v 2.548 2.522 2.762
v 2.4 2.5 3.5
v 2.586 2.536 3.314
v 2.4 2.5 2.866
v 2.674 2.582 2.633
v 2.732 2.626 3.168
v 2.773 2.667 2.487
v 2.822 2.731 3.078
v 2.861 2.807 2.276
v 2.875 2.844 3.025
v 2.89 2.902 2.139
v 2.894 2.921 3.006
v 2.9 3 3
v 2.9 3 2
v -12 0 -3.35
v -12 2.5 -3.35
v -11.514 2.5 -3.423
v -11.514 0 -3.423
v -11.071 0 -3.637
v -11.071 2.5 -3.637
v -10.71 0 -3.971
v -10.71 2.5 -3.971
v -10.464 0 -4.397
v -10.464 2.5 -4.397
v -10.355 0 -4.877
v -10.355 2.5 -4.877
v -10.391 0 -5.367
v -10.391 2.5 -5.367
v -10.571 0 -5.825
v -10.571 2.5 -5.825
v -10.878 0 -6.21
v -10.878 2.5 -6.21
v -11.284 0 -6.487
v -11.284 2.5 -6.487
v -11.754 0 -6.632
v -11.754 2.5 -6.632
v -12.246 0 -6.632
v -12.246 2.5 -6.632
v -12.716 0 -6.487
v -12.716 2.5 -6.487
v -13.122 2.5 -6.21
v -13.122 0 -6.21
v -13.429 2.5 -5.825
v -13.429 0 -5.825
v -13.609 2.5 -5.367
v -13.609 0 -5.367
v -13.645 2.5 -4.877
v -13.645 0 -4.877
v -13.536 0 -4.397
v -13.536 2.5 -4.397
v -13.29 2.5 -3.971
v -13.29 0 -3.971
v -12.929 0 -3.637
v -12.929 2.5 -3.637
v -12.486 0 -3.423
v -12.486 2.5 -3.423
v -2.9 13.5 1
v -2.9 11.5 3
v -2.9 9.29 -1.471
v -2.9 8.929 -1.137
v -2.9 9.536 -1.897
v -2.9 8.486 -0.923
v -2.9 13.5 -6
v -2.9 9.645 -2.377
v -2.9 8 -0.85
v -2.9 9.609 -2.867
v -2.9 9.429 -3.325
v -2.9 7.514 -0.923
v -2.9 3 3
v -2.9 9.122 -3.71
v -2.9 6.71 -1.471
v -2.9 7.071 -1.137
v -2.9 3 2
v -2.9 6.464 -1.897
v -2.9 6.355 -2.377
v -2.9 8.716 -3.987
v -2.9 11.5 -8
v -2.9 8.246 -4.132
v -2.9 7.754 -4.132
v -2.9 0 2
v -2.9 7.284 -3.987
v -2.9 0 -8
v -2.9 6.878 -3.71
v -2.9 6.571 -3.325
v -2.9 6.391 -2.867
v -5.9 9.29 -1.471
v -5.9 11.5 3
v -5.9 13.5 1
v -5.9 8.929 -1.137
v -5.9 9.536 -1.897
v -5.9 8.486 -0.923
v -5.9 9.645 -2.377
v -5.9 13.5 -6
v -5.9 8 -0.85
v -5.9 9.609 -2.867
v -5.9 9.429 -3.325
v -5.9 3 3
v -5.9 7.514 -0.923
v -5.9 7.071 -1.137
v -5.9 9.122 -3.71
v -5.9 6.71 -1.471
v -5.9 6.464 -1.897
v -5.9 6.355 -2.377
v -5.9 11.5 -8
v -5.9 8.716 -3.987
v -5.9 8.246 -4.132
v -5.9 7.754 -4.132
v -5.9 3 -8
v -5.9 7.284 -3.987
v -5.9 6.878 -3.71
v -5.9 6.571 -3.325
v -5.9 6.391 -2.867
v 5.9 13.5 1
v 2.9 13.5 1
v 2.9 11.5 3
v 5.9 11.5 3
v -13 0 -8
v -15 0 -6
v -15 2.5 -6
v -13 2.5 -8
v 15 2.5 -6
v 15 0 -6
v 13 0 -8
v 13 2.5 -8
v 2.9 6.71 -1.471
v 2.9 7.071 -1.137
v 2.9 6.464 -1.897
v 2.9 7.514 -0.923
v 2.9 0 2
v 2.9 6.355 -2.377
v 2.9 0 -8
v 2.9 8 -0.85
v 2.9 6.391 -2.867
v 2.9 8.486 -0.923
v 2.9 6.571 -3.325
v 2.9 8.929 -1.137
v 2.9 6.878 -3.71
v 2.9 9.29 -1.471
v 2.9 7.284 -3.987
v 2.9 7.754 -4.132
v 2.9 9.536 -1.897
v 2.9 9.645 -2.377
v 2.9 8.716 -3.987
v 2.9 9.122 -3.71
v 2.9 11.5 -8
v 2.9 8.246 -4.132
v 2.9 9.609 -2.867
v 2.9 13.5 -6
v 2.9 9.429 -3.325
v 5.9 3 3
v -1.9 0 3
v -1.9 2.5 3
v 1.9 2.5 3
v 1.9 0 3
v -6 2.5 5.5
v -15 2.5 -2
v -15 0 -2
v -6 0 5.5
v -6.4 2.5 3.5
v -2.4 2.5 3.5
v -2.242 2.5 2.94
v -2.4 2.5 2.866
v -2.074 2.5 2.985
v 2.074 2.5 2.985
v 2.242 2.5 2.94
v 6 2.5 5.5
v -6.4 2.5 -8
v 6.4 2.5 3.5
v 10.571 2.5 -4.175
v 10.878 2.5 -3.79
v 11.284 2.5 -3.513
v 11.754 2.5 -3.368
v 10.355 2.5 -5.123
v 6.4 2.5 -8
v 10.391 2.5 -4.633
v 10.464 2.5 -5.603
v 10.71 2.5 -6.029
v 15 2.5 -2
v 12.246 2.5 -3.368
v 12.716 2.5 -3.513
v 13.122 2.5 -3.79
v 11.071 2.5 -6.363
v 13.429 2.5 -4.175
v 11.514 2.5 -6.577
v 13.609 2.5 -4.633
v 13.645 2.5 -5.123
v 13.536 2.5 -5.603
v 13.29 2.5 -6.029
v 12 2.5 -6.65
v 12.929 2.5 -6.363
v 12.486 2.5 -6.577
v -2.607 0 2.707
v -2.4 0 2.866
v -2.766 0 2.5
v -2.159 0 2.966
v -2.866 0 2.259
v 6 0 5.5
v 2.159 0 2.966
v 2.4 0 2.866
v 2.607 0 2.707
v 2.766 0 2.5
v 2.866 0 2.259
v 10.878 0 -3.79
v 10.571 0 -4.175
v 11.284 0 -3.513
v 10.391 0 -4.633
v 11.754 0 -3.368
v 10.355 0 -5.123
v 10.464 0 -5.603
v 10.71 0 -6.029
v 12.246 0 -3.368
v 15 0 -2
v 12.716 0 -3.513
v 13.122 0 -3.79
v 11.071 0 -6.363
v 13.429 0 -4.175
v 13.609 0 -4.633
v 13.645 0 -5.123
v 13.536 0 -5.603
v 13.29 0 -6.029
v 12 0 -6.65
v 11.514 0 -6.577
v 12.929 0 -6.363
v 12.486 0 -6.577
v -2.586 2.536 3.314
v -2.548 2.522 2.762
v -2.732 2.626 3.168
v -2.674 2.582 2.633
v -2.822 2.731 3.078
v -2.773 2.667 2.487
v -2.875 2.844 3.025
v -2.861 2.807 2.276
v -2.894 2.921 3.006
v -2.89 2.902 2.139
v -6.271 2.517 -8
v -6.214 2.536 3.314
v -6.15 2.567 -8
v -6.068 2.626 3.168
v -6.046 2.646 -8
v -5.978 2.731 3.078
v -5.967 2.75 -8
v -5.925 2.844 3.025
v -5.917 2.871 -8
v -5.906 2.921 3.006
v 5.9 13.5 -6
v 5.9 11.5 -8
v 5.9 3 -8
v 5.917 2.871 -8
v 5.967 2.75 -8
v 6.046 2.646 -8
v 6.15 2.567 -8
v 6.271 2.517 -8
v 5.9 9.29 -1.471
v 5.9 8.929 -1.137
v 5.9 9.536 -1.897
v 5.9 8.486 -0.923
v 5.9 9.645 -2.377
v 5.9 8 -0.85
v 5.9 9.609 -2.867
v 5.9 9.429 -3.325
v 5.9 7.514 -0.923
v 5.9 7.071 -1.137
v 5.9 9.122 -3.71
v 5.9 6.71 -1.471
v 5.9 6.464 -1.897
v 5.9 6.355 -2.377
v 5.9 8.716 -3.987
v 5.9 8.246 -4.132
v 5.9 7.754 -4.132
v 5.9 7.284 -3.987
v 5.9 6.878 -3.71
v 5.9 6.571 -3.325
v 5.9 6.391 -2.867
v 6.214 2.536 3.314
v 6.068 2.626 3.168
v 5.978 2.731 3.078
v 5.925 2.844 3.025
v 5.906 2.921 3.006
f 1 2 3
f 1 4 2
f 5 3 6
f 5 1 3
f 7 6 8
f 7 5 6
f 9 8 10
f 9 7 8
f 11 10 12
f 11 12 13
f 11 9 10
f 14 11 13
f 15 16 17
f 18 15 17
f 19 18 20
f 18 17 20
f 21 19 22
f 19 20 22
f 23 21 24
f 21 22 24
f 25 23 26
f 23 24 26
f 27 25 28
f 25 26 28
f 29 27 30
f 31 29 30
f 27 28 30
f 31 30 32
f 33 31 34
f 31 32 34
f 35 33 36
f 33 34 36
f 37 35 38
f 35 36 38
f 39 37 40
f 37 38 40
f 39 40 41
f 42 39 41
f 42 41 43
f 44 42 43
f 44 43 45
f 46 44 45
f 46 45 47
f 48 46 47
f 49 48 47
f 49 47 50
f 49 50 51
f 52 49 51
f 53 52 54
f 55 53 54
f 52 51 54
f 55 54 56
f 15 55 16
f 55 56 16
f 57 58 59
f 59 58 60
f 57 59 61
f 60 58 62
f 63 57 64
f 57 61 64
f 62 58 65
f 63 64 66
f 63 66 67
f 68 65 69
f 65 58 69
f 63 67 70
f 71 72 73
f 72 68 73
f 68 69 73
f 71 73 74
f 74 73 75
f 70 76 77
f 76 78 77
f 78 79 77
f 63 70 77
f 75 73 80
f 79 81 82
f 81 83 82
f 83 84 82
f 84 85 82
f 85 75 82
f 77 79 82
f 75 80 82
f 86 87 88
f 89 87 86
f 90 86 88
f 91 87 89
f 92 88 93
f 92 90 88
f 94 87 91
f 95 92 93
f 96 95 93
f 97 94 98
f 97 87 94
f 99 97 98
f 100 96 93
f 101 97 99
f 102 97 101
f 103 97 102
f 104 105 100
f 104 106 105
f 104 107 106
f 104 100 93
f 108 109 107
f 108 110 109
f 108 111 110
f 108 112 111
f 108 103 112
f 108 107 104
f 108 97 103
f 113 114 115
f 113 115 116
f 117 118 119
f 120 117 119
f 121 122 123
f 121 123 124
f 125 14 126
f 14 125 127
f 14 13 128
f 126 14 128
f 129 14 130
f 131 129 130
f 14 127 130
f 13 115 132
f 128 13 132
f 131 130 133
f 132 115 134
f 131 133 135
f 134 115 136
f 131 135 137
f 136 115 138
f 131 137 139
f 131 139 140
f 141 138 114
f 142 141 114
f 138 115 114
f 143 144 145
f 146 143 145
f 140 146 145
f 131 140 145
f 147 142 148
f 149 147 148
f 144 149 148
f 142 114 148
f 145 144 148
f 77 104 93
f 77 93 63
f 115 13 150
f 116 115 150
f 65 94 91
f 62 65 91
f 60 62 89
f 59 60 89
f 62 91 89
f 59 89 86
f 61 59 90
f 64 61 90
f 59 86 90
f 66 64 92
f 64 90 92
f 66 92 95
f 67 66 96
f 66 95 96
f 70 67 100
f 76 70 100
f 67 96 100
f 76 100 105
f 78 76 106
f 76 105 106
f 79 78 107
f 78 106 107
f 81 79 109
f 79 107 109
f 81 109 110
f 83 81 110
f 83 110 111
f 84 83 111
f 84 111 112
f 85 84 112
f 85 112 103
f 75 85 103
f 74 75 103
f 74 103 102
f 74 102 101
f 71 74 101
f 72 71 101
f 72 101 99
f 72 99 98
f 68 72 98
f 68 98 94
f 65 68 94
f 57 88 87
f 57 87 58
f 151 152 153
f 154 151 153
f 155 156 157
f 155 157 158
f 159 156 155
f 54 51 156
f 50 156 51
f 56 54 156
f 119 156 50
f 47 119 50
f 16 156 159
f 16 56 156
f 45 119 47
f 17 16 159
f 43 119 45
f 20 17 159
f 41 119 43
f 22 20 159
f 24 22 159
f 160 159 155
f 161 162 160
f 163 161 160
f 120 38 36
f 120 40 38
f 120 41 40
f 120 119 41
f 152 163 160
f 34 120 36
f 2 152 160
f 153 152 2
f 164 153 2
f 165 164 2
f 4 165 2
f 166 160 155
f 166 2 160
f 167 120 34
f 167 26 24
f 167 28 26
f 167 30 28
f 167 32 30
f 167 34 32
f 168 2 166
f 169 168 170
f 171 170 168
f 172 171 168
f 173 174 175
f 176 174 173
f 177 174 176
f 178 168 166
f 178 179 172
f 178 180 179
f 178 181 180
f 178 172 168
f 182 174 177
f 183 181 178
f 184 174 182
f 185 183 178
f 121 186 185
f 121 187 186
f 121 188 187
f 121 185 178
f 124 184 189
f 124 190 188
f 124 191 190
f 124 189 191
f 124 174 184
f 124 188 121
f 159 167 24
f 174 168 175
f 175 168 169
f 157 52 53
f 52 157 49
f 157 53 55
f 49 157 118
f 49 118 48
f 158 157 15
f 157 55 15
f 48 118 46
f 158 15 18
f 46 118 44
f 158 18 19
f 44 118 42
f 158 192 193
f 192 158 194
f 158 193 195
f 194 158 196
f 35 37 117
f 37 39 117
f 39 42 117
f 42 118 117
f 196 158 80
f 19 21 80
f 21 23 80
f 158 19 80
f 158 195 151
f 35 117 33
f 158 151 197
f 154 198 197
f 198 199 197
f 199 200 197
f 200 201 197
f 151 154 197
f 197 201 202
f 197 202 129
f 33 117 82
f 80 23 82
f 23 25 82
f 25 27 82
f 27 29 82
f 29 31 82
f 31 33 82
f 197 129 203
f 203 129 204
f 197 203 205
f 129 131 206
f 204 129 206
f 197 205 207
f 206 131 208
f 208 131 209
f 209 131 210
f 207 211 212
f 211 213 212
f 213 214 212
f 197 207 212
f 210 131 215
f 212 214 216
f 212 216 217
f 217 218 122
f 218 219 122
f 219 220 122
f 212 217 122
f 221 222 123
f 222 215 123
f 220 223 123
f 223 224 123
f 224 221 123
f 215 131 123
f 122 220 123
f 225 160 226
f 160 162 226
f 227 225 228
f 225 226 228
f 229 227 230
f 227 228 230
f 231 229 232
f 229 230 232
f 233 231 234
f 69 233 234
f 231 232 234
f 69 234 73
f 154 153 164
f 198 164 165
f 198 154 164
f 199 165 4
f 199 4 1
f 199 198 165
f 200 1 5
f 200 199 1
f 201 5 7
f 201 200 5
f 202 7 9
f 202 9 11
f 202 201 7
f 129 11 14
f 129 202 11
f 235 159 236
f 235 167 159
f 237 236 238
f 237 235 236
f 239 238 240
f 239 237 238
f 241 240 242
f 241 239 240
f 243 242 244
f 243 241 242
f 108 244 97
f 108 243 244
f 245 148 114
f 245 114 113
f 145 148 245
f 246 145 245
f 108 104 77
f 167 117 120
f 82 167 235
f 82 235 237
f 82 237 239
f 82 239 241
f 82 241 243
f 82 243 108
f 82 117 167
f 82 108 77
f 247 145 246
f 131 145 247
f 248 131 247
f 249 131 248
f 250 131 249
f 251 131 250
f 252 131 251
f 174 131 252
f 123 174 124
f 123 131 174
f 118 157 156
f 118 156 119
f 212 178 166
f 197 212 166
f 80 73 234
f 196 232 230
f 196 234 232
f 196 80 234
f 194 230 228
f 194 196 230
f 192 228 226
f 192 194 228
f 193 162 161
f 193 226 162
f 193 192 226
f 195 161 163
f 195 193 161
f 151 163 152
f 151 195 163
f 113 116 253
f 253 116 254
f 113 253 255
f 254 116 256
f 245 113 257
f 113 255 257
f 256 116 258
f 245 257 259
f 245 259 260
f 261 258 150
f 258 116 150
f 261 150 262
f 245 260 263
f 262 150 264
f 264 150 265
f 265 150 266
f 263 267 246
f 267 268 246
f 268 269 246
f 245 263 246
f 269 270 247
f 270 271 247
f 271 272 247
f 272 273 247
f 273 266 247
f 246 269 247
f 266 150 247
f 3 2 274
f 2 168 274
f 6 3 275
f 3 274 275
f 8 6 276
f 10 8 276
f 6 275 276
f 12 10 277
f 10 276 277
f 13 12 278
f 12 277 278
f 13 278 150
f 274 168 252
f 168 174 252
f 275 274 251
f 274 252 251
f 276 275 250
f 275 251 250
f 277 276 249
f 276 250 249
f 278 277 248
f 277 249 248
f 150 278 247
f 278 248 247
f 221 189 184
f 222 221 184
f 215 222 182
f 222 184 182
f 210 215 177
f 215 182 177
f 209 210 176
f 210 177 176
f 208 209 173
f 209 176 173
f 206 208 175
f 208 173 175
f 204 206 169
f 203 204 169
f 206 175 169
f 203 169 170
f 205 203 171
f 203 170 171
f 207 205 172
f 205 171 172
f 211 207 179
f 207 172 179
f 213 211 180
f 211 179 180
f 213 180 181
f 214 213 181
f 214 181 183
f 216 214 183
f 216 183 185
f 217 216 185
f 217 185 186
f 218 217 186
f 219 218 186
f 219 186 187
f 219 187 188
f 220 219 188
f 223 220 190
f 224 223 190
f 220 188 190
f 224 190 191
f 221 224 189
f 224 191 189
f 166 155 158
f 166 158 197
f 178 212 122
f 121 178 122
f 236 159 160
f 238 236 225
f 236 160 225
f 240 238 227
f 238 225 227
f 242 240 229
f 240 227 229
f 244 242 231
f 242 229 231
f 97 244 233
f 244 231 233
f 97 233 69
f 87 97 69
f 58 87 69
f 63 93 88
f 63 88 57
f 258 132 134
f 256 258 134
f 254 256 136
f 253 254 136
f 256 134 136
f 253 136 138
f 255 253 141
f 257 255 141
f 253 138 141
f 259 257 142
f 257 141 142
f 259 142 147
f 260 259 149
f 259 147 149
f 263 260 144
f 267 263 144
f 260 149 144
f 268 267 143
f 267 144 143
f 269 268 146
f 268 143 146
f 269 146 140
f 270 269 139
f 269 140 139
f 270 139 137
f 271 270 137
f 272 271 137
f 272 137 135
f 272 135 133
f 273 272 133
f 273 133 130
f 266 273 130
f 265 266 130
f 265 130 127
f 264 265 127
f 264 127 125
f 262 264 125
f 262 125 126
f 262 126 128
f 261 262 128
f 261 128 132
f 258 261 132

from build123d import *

# Parameters (mm, degrees)
SKETCH_1_W          = 30
SKETCH_1_H          = 16
EXTRUDE_1_DEPTH     = 2.5
SKETCH_3_R          = 1.65
CUT_EXTRUDE_1_DEPTH = 2.5
SKETCH_4_W          = 5.8
SKETCH_4_H          = 11
CUT_EXTRUDE_2_DEPTH = 2.5
SKETCH_5_W          = 3
SKETCH_5_H          = 11
EXTRUDE_2_DEPTH     = 11
SKETCH_6_R          = 1.65
CUT_EXTRUDE_3_DEPTH = 27.135416584
CUT_EXTRUDE_4_DEPTH = 21.248456731
CHAMFER_1_SIZE      = 2
FILLET_1_R          = 1
FILLET_2_R          = 0.5
CUT_EXTRUDE_6_DEPTH = 21.248456731


with BuildPart() as part:
    # 草图1 → 凸台-拉伸1 (new body)
    with BuildSketch(Plane(origin=(0, 0, 0), x_dir=(1, 0, 0), z_dir=(0, 1, 0))):
        Rectangle(SKETCH_1_W, SKETCH_1_H)
    extrude(amount=EXTRUDE_1_DEPTH)

    # 草图3 → 切除-拉伸1 (cut)
    with BuildSketch(Plane(origin=(0, 2.5, 0), x_dir=(1, 0, 0), z_dir=(0, 1, 0))):
        with Locations(Location((-12, 5, 0), (0, 0, 270))):
            Circle(SKETCH_3_R)
        with Locations(Location((12, 5, 0), (0, 0, 90))):
            Circle(SKETCH_3_R)
        with Locations(Location((12, -5, 0), (0, 0, 270))):
            Circle(SKETCH_3_R)
        with Locations(Location((-12, -5, 0), (0, 0, 90))):
            Circle(SKETCH_3_R)
        with Locations(Location((0, 5, 0), (0, 0, 270))):
            Circle(SKETCH_3_R)
    extrude(amount=-CUT_EXTRUDE_1_DEPTH, mode=Mode.SUBTRACT)

    # 草图4 → 切除-拉伸2 (cut)
    with BuildSketch(Plane(origin=(0, 2.5, 0), x_dir=(1, 0, 0), z_dir=(0, 1, 0))):
        with Locations((0, 2.5)):
            Rectangle(SKETCH_4_W, SKETCH_4_H)
    extrude(amount=-CUT_EXTRUDE_2_DEPTH, mode=Mode.SUBTRACT)

    # 草图5 → 凸台-拉伸2 (add)
    with BuildSketch(Plane(origin=(0, 2.5, 0), x_dir=(1, 0, 0), z_dir=(0, 1, 0))):
        with Locations((-4.4, 2.5)):
            Rectangle(SKETCH_5_W, SKETCH_5_H)
        with Locations((4.4, 2.5)):
            Rectangle(SKETCH_5_W, SKETCH_5_H)
    extrude(amount=EXTRUDE_2_DEPTH)

    # 草图6 → 切除-拉伸3 (cut, through all)
    with BuildSketch(Plane.ZY.offset(5.9)):
        with Locations((-2.5, 8)):
            Circle(SKETCH_6_R)
    extrude(amount=-CUT_EXTRUDE_3_DEPTH, mode=Mode.SUBTRACT)

    # 草图7 → 切除-拉伸4 (cut, through all)
    with BuildSketch(Plane(origin=(0, 2.5, 0), x_dir=(1, 0, 0), z_dir=(0, 1, 0))):
        Polygon((-15, 2), (-3, -8), (-15, -8), align=None)
        Polygon((3, -8), (15, -8), (15, 2), align=None)
    extrude(amount=-CUT_EXTRUDE_4_DEPTH, mode=Mode.SUBTRACT)

    # 倒角1
    chamfer_1_edges = [part.edges().sort_by_distance(p)[0] for p in [
        (-4.4, 13.5, -8),
        (-4.4, 13.5, 3),
        (4.4, 13.5, 3),
        (4.4, 13.5, -8),
        (-15, 1.25, -8),
        (15, 1.25, -8),
    ]]
    chamfer(chamfer_1_edges, length=CHAMFER_1_SIZE)

    # 圆角1
    fillet_1_edges = [part.edges().sort_by_distance(p)[0] for p in [
        (-2.9, 1.25, 3),
        (2.9, 1.25, 3),
    ]]
    fillet(fillet_1_edges, radius=FILLET_1_R)

    # 圆角2
    fillet_2_edges = [part.edges().sort_by_distance(p)[0] for p in [
        (-2.9, 2.5, 2.5),
        (2.9, 2.5, 2.5),
        (-5.9, 2.5, -2.5),
        (-4.4, 2.5, 3),
        (4.4, 2.5, 3),
        (5.9, 2.5, -2.5),
    ]]
    fillet(fillet_2_edges, radius=FILLET_2_R)

    # 草图8 → 切除-拉伸6 (cut, through all)
    with BuildSketch(Plane(origin=(0, 2.5, 0), x_dir=(1, 0, 0), z_dir=(0, 1, 0))):
        Polygon((-6, -5.5), (6, -5.5), (3, -8), (-3, -8), align=None)
    extrude(amount=-CUT_EXTRUDE_6_DEPTH, mode=Mode.SUBTRACT)


solid = part.part
